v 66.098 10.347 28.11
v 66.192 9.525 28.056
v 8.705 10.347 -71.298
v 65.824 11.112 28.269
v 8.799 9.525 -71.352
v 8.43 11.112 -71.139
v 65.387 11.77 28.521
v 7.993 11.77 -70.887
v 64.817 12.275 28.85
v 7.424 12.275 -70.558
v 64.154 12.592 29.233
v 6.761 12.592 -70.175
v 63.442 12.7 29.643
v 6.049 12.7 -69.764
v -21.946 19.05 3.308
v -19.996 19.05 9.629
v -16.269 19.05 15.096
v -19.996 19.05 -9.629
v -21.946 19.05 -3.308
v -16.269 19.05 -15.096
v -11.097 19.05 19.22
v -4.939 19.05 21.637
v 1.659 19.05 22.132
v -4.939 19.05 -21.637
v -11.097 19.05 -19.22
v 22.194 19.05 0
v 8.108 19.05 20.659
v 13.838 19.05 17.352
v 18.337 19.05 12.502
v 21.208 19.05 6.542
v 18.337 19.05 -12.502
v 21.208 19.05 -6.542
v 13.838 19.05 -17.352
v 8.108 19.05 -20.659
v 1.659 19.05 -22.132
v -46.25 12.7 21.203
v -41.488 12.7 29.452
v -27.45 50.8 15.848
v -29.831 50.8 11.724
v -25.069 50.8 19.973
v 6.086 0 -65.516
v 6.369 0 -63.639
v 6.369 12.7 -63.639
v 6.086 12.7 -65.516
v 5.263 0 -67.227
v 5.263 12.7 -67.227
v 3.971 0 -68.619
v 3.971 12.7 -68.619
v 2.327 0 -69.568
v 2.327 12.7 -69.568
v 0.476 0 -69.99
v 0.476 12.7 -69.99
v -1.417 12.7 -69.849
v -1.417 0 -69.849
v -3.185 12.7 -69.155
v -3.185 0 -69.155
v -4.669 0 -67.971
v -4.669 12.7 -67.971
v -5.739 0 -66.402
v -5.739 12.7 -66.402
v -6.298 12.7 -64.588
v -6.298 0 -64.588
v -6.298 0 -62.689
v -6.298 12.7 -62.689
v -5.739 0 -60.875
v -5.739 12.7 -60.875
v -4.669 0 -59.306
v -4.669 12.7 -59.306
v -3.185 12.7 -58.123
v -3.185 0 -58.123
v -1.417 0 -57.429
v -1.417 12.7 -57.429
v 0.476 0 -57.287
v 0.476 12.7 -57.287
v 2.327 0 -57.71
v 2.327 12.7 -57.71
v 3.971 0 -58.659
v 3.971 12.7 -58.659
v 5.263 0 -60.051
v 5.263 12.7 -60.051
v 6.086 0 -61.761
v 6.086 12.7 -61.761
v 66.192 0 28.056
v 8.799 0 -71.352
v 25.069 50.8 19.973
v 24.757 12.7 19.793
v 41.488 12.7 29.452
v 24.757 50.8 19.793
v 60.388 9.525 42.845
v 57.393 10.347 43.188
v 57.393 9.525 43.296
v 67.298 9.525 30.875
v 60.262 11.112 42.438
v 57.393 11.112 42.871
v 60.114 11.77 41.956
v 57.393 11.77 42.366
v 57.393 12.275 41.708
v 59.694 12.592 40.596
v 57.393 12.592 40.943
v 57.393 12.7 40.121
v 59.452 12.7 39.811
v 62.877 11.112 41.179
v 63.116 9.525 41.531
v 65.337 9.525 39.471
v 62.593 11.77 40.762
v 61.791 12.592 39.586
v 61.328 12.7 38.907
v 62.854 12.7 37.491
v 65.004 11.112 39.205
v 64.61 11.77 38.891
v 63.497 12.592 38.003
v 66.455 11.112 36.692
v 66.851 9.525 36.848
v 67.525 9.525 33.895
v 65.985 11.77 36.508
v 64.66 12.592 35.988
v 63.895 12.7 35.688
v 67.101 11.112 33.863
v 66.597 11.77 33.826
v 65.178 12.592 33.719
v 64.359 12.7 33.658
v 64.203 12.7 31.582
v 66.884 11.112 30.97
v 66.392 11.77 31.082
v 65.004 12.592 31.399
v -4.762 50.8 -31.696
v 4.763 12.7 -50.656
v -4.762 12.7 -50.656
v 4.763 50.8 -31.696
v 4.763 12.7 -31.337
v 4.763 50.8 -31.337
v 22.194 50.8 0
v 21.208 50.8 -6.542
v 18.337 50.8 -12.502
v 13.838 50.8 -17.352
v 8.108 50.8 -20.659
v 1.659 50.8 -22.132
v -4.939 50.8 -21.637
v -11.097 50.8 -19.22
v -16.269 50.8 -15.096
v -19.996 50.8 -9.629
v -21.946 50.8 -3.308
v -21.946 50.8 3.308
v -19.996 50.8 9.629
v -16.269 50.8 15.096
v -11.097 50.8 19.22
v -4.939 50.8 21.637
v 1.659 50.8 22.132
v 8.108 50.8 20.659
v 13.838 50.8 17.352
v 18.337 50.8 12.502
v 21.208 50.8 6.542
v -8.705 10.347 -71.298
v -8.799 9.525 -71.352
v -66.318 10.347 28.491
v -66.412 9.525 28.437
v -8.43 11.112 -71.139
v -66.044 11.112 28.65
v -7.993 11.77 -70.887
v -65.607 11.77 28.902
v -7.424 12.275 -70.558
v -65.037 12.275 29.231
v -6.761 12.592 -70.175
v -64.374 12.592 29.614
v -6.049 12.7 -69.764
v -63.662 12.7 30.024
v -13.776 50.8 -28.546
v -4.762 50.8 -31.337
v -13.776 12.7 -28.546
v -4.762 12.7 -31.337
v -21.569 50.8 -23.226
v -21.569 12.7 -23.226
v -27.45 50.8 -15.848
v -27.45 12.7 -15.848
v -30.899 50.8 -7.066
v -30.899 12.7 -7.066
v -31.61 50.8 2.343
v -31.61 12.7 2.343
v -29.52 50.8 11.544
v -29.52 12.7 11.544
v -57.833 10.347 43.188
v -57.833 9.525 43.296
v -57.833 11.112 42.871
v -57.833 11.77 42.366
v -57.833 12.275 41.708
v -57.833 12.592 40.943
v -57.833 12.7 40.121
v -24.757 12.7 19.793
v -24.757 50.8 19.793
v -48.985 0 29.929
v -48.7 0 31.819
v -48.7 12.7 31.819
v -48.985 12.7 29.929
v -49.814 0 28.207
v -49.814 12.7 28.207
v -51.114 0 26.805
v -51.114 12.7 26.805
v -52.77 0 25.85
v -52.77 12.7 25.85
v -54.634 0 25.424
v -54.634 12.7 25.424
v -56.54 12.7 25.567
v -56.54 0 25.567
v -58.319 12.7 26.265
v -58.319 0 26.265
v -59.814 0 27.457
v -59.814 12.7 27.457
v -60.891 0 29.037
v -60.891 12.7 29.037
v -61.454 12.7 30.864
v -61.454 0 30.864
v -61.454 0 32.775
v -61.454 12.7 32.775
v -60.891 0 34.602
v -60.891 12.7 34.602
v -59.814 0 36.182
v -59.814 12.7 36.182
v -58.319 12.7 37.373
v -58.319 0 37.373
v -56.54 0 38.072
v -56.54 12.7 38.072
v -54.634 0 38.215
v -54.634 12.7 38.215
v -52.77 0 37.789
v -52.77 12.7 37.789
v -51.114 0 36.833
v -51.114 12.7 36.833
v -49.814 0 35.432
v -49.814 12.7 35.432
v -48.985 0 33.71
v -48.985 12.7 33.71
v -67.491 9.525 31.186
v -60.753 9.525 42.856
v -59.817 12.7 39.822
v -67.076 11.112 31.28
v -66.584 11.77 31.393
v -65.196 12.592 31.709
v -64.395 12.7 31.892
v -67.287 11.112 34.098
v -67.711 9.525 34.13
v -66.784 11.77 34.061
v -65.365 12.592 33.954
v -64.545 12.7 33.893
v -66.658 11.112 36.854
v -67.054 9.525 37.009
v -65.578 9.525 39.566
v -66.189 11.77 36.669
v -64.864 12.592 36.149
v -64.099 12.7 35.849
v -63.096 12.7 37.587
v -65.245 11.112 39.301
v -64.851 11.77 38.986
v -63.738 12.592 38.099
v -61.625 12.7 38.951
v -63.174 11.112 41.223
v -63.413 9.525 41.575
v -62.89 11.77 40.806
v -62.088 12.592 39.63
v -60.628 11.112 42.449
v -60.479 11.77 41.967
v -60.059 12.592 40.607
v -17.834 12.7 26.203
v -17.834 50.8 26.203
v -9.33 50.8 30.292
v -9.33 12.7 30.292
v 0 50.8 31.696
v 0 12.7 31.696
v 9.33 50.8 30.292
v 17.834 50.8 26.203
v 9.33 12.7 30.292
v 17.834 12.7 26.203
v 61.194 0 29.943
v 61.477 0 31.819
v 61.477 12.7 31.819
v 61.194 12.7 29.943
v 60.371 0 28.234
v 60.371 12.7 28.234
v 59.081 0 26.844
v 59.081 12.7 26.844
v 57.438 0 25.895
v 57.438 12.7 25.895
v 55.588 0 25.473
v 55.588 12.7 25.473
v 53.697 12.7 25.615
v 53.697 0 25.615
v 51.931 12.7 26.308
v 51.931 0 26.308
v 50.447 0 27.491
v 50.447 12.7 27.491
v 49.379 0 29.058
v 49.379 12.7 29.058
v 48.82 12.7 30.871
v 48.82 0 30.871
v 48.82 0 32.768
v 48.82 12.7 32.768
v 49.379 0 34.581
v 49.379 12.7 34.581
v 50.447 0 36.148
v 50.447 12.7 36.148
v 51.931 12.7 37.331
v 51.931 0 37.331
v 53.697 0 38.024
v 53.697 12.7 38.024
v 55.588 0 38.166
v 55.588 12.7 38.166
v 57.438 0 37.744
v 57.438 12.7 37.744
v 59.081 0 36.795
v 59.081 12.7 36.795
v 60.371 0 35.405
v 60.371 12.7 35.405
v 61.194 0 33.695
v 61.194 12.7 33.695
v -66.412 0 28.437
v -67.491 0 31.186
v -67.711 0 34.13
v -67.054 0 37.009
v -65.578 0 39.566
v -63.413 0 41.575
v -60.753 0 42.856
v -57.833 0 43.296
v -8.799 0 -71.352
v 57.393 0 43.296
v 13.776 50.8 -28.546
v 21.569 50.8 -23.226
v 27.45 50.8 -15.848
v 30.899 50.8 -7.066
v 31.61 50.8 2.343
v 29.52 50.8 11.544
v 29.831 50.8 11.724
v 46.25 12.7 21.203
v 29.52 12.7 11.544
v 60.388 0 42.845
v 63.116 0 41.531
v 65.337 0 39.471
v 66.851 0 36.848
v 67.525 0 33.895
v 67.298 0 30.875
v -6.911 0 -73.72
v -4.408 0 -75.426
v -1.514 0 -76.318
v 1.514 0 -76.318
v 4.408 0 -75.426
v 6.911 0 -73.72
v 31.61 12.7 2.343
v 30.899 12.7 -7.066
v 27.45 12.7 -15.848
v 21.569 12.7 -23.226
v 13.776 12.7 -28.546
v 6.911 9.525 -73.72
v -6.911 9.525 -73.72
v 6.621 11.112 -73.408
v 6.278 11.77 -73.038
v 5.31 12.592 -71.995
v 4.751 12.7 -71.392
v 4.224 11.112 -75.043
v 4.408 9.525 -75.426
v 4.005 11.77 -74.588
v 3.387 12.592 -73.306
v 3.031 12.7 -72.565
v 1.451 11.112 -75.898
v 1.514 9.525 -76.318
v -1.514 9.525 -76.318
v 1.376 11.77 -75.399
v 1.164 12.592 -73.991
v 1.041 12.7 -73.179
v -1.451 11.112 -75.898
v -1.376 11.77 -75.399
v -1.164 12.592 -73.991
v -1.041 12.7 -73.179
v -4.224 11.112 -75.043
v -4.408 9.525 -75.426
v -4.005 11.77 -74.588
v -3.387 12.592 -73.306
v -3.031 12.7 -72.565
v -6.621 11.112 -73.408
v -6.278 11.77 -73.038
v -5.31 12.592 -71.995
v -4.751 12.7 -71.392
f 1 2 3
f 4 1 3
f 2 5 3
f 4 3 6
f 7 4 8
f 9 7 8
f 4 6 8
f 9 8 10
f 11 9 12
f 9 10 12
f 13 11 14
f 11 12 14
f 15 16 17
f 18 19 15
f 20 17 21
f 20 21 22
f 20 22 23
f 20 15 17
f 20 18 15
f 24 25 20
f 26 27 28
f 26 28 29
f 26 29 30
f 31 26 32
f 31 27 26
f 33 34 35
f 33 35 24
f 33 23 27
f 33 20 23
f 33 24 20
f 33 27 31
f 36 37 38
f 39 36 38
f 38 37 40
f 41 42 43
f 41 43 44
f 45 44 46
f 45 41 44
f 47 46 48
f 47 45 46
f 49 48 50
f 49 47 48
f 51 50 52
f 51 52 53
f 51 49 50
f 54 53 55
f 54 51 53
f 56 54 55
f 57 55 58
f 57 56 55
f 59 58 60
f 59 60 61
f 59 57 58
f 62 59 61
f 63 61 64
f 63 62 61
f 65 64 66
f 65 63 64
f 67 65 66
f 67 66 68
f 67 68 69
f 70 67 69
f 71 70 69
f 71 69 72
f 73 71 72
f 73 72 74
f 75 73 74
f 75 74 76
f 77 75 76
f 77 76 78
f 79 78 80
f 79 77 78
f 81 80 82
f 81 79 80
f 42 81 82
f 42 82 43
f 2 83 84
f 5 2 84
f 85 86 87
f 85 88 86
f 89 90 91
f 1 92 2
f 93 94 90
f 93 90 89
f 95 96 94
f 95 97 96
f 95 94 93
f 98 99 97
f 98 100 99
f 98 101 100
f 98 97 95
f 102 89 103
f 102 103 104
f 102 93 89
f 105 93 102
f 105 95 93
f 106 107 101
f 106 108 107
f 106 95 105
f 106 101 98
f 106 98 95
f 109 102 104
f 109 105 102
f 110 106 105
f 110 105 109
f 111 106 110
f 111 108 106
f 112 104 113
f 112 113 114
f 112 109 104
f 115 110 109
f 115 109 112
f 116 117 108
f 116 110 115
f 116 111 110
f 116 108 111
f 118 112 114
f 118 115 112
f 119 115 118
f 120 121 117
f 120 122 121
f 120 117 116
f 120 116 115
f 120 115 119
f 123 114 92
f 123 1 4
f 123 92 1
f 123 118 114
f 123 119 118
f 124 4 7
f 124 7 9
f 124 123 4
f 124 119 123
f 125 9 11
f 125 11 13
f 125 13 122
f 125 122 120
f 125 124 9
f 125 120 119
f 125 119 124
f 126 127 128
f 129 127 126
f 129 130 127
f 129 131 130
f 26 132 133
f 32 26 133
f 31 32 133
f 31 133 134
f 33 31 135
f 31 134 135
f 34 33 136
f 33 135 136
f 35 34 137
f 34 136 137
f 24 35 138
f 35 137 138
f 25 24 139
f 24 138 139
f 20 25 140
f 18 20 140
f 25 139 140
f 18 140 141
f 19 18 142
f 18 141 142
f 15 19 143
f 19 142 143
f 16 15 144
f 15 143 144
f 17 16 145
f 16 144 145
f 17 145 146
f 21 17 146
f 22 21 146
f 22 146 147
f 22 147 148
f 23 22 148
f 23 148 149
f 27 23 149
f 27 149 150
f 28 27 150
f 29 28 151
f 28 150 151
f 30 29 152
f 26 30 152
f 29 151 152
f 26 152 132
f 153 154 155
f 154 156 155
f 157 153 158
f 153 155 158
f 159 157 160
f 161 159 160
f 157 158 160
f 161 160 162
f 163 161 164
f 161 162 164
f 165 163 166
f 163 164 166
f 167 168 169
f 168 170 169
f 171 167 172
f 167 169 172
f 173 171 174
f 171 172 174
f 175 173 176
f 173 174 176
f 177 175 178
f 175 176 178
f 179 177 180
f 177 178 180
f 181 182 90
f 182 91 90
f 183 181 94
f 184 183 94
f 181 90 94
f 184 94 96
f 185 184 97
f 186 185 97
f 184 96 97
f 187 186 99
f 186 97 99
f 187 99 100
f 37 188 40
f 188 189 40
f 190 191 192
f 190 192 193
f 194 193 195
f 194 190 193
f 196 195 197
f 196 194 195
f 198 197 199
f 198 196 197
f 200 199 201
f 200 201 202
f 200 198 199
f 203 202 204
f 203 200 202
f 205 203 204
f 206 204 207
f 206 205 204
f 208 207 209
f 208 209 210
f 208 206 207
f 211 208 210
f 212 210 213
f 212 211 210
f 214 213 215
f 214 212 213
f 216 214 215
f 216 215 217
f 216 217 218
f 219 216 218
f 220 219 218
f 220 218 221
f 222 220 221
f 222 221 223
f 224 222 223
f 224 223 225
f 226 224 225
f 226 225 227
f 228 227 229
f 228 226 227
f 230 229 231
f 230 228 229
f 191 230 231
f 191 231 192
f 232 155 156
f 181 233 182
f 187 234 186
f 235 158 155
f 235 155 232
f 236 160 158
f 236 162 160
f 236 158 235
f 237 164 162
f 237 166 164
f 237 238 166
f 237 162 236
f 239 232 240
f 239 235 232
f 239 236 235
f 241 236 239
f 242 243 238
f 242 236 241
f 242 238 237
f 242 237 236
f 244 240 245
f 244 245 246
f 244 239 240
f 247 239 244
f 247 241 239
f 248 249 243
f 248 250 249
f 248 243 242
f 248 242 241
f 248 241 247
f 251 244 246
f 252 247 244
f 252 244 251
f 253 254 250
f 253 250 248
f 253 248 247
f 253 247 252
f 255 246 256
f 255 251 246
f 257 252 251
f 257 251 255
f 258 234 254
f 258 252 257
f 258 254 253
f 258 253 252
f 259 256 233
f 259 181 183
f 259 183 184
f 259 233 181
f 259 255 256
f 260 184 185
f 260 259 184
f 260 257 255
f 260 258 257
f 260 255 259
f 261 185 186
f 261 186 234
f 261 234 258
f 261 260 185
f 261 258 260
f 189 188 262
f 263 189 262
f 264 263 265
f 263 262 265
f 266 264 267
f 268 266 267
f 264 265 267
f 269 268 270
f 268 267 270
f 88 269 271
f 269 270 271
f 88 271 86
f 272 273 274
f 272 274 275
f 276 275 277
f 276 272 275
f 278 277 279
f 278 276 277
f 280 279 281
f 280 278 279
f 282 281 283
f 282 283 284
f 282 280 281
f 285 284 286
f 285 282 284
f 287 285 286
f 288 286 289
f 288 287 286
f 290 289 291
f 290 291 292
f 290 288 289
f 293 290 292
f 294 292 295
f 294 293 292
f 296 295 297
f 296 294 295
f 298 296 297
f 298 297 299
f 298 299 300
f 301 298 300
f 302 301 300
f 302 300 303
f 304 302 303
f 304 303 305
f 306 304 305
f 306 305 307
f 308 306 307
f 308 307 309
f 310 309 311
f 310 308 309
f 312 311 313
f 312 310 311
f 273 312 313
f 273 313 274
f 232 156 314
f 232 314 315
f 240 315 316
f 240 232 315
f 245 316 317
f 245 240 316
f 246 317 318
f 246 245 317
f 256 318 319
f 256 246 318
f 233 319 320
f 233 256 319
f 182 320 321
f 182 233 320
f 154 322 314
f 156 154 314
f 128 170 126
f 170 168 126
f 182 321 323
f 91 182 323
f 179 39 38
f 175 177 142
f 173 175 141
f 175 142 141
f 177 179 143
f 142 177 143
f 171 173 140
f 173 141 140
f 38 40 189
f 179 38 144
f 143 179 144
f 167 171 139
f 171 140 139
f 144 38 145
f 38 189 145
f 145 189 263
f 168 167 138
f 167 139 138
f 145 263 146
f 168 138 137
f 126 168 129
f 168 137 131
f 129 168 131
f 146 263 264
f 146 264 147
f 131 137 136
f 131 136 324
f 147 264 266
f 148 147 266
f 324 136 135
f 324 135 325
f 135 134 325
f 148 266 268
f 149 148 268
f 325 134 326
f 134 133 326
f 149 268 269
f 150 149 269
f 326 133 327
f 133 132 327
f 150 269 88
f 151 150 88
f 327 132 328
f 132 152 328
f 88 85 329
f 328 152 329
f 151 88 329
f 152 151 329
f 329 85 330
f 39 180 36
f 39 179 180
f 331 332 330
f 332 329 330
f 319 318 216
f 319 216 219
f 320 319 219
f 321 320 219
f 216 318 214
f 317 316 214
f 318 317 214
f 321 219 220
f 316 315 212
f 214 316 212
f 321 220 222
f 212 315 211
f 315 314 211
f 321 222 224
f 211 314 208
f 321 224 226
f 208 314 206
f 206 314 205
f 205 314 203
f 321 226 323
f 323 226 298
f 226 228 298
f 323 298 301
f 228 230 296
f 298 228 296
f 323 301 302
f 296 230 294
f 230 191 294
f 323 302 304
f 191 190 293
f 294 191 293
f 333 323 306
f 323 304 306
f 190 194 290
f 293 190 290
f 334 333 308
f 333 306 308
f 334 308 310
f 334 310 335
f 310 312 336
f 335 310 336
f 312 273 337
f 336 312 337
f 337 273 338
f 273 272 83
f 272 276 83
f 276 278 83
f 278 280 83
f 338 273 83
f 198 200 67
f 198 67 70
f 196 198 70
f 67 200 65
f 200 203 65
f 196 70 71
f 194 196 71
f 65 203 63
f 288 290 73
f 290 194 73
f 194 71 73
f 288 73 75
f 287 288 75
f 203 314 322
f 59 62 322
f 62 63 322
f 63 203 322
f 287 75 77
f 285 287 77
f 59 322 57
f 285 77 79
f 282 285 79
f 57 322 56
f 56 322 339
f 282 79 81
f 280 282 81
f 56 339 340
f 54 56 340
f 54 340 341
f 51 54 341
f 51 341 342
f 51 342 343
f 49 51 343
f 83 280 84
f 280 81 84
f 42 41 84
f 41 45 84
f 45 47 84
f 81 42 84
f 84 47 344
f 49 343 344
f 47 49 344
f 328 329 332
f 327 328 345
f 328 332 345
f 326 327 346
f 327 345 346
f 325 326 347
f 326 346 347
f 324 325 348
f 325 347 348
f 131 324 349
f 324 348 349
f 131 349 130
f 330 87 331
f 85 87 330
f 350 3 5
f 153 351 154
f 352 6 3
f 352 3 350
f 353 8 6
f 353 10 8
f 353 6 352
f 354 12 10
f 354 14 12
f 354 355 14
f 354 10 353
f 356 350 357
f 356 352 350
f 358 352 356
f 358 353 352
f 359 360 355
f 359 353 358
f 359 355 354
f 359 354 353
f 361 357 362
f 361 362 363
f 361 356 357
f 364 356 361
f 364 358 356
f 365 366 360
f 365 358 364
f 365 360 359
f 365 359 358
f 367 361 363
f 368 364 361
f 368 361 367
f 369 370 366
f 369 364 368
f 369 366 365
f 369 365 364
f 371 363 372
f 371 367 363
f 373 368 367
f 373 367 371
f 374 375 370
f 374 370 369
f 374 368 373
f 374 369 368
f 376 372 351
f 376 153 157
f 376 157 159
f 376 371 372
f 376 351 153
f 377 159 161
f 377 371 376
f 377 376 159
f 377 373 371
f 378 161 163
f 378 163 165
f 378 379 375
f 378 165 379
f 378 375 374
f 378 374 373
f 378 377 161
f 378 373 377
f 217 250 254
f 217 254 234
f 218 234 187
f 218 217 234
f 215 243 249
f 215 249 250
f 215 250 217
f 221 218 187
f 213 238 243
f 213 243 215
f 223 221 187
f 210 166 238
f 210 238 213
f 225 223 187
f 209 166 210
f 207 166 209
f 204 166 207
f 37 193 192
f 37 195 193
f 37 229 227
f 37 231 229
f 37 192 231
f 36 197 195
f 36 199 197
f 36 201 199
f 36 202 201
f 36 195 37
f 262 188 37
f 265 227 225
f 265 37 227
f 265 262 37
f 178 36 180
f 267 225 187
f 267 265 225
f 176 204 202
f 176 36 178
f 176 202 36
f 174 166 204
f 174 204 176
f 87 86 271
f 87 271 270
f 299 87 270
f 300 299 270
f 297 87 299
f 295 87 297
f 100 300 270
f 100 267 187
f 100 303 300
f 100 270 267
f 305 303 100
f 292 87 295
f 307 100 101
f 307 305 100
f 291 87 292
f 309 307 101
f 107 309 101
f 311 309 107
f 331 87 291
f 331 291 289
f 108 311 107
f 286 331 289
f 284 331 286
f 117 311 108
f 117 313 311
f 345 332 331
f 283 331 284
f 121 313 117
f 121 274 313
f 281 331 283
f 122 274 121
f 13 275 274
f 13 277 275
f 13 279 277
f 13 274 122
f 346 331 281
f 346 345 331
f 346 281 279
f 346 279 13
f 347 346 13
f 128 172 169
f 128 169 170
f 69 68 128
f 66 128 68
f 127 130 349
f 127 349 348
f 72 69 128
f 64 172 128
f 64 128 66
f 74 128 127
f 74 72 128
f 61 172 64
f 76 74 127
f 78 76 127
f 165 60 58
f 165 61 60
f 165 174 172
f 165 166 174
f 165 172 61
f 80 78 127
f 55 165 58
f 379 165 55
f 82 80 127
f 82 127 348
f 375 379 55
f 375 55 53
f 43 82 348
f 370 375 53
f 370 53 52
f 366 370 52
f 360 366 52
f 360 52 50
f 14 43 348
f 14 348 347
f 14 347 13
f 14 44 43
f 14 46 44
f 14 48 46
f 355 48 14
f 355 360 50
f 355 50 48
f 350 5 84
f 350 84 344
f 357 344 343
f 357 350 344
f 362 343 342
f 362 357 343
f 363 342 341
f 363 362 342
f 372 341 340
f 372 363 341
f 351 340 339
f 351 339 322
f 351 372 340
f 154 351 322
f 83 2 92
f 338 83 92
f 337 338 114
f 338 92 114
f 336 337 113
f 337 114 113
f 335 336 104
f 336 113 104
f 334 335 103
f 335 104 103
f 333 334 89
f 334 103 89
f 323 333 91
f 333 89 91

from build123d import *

# Parameters (mm, degrees)
SKETCH1_R           = 6.369474113
SKETCH1_R_2         = 6.364401416
SKETCH1_R_3         = 6.413225573
BOSS_EXTRUDE2_DEPTH = 12.7
FILLET5_R           = 9.906
FILLET6_R           = 10.16
FILLET7_R           = 10.16
FILLET8_R           = 3.175
SKETCH2_R           = 31.696441514
BOSS_EXTRUDE3_DEPTH = 38.1
SKETCH3_R           = 22.193645705
CUT_EXTRUDE1_DEPTH  = 31.75
BOSS_EXTRUDE4_DEPTH = 4.7625
BOSS_EXTRUDE6_DEPTH = 9.525
CIRPATTERN1_COUNT   = 3


with BuildPart() as part:
    # Sketch1 → Boss-Extrude2 (new body)
    with BuildSketch(Plane(origin=(0, 0, 0), x_dir=(1, 0, 0), z_dir=(0, 1, 0))):
        Polygon((0, 86.591919686), (-74.990802211, -43.295959843), (74.990802211, -43.295959843), align=None)
        with Locations((0, 63.638807052)):
            Circle(SKETCH1_R, mode=Mode.SUBTRACT)
        with Locations((55.112823574, -31.819403526)):
            Circle(SKETCH1_R_2, mode=Mode.SUBTRACT)
        with Locations((-55.112823574, -31.819403526)):
            Circle(SKETCH1_R_3, mode=Mode.SUBTRACT)
    extrude(amount=BOSS_EXTRUDE2_DEPTH)

    # Fillet5
    fillet5_edges = [part.edges().sort_by_distance(p)[0] for p in [
        (-74.990802211, 6.35, 43.295959843),
    ]]
    fillet(fillet5_edges, radius=FILLET5_R)

    # Fillet6
    fillet6_edges = [part.edges().sort_by_distance(p)[0] for p in [
        (74.990802211, 6.35, 43.295959843),
    ]]
    fillet(fillet6_edges, radius=FILLET6_R)

    # Fillet7
    fillet7_edges = [part.edges().sort_by_distance(p)[0] for p in [
        (0, 6.35, -86.591919686),
    ]]
    fillet(fillet7_edges, radius=FILLET7_R)

    # Fillet8
    fillet8_edges = [part.edges().sort_by_distance(p)[0] for p in [
        (-0.219970453, 12.7, 43.295959843),
        (-66.411954561, 12.7, 38.342959843),
        (37.495401105, 12.7, -21.647979922),
        (66.191984109, 12.7, 38.215959843),
        (-37.605386332, 12.7, -21.457479922),
        (0, 12.7, -76.431919686),
    ]]
    fillet(fillet8_edges, radius=FILLET8_R)

    # Sketch2 → Boss-Extrude3 (add)
    with BuildSketch(Plane(origin=(0, 12.7, 0), x_dir=(1, 0, 0), z_dir=(0, 1, 0))):
        Circle(SKETCH2_R)
    extrude(amount=BOSS_EXTRUDE3_DEPTH)

    # Sketch3 → Cut-Extrude1 (cut)
    with BuildSketch(Plane(origin=(0, 50.8, 0), x_dir=(1, 0, 0), z_dir=(0, 1, 0))):
        Circle(SKETCH3_R)
    extrude(amount=-CUT_EXTRUDE1_DEPTH, mode=Mode.SUBTRACT)

    # Sketch6 → Boss-Extrude4 (add)
    with BuildSketch(Plane(origin=(0, 0, 0), x_dir=(-0.866025404, 0, 0.5), z_dir=(-0.5, 0, -0.866025404))):
        Polygon((31.696441514, 12.7), (50.655531139, 12.7), (31.696441514, 50.8), (28.066895326, 50.8), (28.066895326, 12.7), align=None)
    extrude(amount=BOSS_EXTRUDE4_DEPTH)

    # Sketch8 → Boss-Extrude6 (add)
    with BuildSketch(Plane(origin=(-2.38125, 0, -4.124445986), x_dir=(-0.866025404, 0, 0.5), z_dir=(-0.5, 0, -0.866025404))):
        Polygon((31.005254456, 12.578941577), (50.655531139, 12.7), (31.696441514, 50.8), (27.148658098, 50.8), (27.148658098, 12.578941577), align=None)
    boss_extrude6 = extrude(amount=-BOSS_EXTRUDE6_DEPTH)

    # CirPattern1: Boss-Extrude6 ×3 about axis
    cirpattern1_axis = Axis((0, 0, 0), (0, 1, 0))
    for i in range(1, CIRPATTERN1_COUNT):
        add(boss_extrude6.rotate(cirpattern1_axis, i * 360 / CIRPATTERN1_COUNT))


solid = part.part
